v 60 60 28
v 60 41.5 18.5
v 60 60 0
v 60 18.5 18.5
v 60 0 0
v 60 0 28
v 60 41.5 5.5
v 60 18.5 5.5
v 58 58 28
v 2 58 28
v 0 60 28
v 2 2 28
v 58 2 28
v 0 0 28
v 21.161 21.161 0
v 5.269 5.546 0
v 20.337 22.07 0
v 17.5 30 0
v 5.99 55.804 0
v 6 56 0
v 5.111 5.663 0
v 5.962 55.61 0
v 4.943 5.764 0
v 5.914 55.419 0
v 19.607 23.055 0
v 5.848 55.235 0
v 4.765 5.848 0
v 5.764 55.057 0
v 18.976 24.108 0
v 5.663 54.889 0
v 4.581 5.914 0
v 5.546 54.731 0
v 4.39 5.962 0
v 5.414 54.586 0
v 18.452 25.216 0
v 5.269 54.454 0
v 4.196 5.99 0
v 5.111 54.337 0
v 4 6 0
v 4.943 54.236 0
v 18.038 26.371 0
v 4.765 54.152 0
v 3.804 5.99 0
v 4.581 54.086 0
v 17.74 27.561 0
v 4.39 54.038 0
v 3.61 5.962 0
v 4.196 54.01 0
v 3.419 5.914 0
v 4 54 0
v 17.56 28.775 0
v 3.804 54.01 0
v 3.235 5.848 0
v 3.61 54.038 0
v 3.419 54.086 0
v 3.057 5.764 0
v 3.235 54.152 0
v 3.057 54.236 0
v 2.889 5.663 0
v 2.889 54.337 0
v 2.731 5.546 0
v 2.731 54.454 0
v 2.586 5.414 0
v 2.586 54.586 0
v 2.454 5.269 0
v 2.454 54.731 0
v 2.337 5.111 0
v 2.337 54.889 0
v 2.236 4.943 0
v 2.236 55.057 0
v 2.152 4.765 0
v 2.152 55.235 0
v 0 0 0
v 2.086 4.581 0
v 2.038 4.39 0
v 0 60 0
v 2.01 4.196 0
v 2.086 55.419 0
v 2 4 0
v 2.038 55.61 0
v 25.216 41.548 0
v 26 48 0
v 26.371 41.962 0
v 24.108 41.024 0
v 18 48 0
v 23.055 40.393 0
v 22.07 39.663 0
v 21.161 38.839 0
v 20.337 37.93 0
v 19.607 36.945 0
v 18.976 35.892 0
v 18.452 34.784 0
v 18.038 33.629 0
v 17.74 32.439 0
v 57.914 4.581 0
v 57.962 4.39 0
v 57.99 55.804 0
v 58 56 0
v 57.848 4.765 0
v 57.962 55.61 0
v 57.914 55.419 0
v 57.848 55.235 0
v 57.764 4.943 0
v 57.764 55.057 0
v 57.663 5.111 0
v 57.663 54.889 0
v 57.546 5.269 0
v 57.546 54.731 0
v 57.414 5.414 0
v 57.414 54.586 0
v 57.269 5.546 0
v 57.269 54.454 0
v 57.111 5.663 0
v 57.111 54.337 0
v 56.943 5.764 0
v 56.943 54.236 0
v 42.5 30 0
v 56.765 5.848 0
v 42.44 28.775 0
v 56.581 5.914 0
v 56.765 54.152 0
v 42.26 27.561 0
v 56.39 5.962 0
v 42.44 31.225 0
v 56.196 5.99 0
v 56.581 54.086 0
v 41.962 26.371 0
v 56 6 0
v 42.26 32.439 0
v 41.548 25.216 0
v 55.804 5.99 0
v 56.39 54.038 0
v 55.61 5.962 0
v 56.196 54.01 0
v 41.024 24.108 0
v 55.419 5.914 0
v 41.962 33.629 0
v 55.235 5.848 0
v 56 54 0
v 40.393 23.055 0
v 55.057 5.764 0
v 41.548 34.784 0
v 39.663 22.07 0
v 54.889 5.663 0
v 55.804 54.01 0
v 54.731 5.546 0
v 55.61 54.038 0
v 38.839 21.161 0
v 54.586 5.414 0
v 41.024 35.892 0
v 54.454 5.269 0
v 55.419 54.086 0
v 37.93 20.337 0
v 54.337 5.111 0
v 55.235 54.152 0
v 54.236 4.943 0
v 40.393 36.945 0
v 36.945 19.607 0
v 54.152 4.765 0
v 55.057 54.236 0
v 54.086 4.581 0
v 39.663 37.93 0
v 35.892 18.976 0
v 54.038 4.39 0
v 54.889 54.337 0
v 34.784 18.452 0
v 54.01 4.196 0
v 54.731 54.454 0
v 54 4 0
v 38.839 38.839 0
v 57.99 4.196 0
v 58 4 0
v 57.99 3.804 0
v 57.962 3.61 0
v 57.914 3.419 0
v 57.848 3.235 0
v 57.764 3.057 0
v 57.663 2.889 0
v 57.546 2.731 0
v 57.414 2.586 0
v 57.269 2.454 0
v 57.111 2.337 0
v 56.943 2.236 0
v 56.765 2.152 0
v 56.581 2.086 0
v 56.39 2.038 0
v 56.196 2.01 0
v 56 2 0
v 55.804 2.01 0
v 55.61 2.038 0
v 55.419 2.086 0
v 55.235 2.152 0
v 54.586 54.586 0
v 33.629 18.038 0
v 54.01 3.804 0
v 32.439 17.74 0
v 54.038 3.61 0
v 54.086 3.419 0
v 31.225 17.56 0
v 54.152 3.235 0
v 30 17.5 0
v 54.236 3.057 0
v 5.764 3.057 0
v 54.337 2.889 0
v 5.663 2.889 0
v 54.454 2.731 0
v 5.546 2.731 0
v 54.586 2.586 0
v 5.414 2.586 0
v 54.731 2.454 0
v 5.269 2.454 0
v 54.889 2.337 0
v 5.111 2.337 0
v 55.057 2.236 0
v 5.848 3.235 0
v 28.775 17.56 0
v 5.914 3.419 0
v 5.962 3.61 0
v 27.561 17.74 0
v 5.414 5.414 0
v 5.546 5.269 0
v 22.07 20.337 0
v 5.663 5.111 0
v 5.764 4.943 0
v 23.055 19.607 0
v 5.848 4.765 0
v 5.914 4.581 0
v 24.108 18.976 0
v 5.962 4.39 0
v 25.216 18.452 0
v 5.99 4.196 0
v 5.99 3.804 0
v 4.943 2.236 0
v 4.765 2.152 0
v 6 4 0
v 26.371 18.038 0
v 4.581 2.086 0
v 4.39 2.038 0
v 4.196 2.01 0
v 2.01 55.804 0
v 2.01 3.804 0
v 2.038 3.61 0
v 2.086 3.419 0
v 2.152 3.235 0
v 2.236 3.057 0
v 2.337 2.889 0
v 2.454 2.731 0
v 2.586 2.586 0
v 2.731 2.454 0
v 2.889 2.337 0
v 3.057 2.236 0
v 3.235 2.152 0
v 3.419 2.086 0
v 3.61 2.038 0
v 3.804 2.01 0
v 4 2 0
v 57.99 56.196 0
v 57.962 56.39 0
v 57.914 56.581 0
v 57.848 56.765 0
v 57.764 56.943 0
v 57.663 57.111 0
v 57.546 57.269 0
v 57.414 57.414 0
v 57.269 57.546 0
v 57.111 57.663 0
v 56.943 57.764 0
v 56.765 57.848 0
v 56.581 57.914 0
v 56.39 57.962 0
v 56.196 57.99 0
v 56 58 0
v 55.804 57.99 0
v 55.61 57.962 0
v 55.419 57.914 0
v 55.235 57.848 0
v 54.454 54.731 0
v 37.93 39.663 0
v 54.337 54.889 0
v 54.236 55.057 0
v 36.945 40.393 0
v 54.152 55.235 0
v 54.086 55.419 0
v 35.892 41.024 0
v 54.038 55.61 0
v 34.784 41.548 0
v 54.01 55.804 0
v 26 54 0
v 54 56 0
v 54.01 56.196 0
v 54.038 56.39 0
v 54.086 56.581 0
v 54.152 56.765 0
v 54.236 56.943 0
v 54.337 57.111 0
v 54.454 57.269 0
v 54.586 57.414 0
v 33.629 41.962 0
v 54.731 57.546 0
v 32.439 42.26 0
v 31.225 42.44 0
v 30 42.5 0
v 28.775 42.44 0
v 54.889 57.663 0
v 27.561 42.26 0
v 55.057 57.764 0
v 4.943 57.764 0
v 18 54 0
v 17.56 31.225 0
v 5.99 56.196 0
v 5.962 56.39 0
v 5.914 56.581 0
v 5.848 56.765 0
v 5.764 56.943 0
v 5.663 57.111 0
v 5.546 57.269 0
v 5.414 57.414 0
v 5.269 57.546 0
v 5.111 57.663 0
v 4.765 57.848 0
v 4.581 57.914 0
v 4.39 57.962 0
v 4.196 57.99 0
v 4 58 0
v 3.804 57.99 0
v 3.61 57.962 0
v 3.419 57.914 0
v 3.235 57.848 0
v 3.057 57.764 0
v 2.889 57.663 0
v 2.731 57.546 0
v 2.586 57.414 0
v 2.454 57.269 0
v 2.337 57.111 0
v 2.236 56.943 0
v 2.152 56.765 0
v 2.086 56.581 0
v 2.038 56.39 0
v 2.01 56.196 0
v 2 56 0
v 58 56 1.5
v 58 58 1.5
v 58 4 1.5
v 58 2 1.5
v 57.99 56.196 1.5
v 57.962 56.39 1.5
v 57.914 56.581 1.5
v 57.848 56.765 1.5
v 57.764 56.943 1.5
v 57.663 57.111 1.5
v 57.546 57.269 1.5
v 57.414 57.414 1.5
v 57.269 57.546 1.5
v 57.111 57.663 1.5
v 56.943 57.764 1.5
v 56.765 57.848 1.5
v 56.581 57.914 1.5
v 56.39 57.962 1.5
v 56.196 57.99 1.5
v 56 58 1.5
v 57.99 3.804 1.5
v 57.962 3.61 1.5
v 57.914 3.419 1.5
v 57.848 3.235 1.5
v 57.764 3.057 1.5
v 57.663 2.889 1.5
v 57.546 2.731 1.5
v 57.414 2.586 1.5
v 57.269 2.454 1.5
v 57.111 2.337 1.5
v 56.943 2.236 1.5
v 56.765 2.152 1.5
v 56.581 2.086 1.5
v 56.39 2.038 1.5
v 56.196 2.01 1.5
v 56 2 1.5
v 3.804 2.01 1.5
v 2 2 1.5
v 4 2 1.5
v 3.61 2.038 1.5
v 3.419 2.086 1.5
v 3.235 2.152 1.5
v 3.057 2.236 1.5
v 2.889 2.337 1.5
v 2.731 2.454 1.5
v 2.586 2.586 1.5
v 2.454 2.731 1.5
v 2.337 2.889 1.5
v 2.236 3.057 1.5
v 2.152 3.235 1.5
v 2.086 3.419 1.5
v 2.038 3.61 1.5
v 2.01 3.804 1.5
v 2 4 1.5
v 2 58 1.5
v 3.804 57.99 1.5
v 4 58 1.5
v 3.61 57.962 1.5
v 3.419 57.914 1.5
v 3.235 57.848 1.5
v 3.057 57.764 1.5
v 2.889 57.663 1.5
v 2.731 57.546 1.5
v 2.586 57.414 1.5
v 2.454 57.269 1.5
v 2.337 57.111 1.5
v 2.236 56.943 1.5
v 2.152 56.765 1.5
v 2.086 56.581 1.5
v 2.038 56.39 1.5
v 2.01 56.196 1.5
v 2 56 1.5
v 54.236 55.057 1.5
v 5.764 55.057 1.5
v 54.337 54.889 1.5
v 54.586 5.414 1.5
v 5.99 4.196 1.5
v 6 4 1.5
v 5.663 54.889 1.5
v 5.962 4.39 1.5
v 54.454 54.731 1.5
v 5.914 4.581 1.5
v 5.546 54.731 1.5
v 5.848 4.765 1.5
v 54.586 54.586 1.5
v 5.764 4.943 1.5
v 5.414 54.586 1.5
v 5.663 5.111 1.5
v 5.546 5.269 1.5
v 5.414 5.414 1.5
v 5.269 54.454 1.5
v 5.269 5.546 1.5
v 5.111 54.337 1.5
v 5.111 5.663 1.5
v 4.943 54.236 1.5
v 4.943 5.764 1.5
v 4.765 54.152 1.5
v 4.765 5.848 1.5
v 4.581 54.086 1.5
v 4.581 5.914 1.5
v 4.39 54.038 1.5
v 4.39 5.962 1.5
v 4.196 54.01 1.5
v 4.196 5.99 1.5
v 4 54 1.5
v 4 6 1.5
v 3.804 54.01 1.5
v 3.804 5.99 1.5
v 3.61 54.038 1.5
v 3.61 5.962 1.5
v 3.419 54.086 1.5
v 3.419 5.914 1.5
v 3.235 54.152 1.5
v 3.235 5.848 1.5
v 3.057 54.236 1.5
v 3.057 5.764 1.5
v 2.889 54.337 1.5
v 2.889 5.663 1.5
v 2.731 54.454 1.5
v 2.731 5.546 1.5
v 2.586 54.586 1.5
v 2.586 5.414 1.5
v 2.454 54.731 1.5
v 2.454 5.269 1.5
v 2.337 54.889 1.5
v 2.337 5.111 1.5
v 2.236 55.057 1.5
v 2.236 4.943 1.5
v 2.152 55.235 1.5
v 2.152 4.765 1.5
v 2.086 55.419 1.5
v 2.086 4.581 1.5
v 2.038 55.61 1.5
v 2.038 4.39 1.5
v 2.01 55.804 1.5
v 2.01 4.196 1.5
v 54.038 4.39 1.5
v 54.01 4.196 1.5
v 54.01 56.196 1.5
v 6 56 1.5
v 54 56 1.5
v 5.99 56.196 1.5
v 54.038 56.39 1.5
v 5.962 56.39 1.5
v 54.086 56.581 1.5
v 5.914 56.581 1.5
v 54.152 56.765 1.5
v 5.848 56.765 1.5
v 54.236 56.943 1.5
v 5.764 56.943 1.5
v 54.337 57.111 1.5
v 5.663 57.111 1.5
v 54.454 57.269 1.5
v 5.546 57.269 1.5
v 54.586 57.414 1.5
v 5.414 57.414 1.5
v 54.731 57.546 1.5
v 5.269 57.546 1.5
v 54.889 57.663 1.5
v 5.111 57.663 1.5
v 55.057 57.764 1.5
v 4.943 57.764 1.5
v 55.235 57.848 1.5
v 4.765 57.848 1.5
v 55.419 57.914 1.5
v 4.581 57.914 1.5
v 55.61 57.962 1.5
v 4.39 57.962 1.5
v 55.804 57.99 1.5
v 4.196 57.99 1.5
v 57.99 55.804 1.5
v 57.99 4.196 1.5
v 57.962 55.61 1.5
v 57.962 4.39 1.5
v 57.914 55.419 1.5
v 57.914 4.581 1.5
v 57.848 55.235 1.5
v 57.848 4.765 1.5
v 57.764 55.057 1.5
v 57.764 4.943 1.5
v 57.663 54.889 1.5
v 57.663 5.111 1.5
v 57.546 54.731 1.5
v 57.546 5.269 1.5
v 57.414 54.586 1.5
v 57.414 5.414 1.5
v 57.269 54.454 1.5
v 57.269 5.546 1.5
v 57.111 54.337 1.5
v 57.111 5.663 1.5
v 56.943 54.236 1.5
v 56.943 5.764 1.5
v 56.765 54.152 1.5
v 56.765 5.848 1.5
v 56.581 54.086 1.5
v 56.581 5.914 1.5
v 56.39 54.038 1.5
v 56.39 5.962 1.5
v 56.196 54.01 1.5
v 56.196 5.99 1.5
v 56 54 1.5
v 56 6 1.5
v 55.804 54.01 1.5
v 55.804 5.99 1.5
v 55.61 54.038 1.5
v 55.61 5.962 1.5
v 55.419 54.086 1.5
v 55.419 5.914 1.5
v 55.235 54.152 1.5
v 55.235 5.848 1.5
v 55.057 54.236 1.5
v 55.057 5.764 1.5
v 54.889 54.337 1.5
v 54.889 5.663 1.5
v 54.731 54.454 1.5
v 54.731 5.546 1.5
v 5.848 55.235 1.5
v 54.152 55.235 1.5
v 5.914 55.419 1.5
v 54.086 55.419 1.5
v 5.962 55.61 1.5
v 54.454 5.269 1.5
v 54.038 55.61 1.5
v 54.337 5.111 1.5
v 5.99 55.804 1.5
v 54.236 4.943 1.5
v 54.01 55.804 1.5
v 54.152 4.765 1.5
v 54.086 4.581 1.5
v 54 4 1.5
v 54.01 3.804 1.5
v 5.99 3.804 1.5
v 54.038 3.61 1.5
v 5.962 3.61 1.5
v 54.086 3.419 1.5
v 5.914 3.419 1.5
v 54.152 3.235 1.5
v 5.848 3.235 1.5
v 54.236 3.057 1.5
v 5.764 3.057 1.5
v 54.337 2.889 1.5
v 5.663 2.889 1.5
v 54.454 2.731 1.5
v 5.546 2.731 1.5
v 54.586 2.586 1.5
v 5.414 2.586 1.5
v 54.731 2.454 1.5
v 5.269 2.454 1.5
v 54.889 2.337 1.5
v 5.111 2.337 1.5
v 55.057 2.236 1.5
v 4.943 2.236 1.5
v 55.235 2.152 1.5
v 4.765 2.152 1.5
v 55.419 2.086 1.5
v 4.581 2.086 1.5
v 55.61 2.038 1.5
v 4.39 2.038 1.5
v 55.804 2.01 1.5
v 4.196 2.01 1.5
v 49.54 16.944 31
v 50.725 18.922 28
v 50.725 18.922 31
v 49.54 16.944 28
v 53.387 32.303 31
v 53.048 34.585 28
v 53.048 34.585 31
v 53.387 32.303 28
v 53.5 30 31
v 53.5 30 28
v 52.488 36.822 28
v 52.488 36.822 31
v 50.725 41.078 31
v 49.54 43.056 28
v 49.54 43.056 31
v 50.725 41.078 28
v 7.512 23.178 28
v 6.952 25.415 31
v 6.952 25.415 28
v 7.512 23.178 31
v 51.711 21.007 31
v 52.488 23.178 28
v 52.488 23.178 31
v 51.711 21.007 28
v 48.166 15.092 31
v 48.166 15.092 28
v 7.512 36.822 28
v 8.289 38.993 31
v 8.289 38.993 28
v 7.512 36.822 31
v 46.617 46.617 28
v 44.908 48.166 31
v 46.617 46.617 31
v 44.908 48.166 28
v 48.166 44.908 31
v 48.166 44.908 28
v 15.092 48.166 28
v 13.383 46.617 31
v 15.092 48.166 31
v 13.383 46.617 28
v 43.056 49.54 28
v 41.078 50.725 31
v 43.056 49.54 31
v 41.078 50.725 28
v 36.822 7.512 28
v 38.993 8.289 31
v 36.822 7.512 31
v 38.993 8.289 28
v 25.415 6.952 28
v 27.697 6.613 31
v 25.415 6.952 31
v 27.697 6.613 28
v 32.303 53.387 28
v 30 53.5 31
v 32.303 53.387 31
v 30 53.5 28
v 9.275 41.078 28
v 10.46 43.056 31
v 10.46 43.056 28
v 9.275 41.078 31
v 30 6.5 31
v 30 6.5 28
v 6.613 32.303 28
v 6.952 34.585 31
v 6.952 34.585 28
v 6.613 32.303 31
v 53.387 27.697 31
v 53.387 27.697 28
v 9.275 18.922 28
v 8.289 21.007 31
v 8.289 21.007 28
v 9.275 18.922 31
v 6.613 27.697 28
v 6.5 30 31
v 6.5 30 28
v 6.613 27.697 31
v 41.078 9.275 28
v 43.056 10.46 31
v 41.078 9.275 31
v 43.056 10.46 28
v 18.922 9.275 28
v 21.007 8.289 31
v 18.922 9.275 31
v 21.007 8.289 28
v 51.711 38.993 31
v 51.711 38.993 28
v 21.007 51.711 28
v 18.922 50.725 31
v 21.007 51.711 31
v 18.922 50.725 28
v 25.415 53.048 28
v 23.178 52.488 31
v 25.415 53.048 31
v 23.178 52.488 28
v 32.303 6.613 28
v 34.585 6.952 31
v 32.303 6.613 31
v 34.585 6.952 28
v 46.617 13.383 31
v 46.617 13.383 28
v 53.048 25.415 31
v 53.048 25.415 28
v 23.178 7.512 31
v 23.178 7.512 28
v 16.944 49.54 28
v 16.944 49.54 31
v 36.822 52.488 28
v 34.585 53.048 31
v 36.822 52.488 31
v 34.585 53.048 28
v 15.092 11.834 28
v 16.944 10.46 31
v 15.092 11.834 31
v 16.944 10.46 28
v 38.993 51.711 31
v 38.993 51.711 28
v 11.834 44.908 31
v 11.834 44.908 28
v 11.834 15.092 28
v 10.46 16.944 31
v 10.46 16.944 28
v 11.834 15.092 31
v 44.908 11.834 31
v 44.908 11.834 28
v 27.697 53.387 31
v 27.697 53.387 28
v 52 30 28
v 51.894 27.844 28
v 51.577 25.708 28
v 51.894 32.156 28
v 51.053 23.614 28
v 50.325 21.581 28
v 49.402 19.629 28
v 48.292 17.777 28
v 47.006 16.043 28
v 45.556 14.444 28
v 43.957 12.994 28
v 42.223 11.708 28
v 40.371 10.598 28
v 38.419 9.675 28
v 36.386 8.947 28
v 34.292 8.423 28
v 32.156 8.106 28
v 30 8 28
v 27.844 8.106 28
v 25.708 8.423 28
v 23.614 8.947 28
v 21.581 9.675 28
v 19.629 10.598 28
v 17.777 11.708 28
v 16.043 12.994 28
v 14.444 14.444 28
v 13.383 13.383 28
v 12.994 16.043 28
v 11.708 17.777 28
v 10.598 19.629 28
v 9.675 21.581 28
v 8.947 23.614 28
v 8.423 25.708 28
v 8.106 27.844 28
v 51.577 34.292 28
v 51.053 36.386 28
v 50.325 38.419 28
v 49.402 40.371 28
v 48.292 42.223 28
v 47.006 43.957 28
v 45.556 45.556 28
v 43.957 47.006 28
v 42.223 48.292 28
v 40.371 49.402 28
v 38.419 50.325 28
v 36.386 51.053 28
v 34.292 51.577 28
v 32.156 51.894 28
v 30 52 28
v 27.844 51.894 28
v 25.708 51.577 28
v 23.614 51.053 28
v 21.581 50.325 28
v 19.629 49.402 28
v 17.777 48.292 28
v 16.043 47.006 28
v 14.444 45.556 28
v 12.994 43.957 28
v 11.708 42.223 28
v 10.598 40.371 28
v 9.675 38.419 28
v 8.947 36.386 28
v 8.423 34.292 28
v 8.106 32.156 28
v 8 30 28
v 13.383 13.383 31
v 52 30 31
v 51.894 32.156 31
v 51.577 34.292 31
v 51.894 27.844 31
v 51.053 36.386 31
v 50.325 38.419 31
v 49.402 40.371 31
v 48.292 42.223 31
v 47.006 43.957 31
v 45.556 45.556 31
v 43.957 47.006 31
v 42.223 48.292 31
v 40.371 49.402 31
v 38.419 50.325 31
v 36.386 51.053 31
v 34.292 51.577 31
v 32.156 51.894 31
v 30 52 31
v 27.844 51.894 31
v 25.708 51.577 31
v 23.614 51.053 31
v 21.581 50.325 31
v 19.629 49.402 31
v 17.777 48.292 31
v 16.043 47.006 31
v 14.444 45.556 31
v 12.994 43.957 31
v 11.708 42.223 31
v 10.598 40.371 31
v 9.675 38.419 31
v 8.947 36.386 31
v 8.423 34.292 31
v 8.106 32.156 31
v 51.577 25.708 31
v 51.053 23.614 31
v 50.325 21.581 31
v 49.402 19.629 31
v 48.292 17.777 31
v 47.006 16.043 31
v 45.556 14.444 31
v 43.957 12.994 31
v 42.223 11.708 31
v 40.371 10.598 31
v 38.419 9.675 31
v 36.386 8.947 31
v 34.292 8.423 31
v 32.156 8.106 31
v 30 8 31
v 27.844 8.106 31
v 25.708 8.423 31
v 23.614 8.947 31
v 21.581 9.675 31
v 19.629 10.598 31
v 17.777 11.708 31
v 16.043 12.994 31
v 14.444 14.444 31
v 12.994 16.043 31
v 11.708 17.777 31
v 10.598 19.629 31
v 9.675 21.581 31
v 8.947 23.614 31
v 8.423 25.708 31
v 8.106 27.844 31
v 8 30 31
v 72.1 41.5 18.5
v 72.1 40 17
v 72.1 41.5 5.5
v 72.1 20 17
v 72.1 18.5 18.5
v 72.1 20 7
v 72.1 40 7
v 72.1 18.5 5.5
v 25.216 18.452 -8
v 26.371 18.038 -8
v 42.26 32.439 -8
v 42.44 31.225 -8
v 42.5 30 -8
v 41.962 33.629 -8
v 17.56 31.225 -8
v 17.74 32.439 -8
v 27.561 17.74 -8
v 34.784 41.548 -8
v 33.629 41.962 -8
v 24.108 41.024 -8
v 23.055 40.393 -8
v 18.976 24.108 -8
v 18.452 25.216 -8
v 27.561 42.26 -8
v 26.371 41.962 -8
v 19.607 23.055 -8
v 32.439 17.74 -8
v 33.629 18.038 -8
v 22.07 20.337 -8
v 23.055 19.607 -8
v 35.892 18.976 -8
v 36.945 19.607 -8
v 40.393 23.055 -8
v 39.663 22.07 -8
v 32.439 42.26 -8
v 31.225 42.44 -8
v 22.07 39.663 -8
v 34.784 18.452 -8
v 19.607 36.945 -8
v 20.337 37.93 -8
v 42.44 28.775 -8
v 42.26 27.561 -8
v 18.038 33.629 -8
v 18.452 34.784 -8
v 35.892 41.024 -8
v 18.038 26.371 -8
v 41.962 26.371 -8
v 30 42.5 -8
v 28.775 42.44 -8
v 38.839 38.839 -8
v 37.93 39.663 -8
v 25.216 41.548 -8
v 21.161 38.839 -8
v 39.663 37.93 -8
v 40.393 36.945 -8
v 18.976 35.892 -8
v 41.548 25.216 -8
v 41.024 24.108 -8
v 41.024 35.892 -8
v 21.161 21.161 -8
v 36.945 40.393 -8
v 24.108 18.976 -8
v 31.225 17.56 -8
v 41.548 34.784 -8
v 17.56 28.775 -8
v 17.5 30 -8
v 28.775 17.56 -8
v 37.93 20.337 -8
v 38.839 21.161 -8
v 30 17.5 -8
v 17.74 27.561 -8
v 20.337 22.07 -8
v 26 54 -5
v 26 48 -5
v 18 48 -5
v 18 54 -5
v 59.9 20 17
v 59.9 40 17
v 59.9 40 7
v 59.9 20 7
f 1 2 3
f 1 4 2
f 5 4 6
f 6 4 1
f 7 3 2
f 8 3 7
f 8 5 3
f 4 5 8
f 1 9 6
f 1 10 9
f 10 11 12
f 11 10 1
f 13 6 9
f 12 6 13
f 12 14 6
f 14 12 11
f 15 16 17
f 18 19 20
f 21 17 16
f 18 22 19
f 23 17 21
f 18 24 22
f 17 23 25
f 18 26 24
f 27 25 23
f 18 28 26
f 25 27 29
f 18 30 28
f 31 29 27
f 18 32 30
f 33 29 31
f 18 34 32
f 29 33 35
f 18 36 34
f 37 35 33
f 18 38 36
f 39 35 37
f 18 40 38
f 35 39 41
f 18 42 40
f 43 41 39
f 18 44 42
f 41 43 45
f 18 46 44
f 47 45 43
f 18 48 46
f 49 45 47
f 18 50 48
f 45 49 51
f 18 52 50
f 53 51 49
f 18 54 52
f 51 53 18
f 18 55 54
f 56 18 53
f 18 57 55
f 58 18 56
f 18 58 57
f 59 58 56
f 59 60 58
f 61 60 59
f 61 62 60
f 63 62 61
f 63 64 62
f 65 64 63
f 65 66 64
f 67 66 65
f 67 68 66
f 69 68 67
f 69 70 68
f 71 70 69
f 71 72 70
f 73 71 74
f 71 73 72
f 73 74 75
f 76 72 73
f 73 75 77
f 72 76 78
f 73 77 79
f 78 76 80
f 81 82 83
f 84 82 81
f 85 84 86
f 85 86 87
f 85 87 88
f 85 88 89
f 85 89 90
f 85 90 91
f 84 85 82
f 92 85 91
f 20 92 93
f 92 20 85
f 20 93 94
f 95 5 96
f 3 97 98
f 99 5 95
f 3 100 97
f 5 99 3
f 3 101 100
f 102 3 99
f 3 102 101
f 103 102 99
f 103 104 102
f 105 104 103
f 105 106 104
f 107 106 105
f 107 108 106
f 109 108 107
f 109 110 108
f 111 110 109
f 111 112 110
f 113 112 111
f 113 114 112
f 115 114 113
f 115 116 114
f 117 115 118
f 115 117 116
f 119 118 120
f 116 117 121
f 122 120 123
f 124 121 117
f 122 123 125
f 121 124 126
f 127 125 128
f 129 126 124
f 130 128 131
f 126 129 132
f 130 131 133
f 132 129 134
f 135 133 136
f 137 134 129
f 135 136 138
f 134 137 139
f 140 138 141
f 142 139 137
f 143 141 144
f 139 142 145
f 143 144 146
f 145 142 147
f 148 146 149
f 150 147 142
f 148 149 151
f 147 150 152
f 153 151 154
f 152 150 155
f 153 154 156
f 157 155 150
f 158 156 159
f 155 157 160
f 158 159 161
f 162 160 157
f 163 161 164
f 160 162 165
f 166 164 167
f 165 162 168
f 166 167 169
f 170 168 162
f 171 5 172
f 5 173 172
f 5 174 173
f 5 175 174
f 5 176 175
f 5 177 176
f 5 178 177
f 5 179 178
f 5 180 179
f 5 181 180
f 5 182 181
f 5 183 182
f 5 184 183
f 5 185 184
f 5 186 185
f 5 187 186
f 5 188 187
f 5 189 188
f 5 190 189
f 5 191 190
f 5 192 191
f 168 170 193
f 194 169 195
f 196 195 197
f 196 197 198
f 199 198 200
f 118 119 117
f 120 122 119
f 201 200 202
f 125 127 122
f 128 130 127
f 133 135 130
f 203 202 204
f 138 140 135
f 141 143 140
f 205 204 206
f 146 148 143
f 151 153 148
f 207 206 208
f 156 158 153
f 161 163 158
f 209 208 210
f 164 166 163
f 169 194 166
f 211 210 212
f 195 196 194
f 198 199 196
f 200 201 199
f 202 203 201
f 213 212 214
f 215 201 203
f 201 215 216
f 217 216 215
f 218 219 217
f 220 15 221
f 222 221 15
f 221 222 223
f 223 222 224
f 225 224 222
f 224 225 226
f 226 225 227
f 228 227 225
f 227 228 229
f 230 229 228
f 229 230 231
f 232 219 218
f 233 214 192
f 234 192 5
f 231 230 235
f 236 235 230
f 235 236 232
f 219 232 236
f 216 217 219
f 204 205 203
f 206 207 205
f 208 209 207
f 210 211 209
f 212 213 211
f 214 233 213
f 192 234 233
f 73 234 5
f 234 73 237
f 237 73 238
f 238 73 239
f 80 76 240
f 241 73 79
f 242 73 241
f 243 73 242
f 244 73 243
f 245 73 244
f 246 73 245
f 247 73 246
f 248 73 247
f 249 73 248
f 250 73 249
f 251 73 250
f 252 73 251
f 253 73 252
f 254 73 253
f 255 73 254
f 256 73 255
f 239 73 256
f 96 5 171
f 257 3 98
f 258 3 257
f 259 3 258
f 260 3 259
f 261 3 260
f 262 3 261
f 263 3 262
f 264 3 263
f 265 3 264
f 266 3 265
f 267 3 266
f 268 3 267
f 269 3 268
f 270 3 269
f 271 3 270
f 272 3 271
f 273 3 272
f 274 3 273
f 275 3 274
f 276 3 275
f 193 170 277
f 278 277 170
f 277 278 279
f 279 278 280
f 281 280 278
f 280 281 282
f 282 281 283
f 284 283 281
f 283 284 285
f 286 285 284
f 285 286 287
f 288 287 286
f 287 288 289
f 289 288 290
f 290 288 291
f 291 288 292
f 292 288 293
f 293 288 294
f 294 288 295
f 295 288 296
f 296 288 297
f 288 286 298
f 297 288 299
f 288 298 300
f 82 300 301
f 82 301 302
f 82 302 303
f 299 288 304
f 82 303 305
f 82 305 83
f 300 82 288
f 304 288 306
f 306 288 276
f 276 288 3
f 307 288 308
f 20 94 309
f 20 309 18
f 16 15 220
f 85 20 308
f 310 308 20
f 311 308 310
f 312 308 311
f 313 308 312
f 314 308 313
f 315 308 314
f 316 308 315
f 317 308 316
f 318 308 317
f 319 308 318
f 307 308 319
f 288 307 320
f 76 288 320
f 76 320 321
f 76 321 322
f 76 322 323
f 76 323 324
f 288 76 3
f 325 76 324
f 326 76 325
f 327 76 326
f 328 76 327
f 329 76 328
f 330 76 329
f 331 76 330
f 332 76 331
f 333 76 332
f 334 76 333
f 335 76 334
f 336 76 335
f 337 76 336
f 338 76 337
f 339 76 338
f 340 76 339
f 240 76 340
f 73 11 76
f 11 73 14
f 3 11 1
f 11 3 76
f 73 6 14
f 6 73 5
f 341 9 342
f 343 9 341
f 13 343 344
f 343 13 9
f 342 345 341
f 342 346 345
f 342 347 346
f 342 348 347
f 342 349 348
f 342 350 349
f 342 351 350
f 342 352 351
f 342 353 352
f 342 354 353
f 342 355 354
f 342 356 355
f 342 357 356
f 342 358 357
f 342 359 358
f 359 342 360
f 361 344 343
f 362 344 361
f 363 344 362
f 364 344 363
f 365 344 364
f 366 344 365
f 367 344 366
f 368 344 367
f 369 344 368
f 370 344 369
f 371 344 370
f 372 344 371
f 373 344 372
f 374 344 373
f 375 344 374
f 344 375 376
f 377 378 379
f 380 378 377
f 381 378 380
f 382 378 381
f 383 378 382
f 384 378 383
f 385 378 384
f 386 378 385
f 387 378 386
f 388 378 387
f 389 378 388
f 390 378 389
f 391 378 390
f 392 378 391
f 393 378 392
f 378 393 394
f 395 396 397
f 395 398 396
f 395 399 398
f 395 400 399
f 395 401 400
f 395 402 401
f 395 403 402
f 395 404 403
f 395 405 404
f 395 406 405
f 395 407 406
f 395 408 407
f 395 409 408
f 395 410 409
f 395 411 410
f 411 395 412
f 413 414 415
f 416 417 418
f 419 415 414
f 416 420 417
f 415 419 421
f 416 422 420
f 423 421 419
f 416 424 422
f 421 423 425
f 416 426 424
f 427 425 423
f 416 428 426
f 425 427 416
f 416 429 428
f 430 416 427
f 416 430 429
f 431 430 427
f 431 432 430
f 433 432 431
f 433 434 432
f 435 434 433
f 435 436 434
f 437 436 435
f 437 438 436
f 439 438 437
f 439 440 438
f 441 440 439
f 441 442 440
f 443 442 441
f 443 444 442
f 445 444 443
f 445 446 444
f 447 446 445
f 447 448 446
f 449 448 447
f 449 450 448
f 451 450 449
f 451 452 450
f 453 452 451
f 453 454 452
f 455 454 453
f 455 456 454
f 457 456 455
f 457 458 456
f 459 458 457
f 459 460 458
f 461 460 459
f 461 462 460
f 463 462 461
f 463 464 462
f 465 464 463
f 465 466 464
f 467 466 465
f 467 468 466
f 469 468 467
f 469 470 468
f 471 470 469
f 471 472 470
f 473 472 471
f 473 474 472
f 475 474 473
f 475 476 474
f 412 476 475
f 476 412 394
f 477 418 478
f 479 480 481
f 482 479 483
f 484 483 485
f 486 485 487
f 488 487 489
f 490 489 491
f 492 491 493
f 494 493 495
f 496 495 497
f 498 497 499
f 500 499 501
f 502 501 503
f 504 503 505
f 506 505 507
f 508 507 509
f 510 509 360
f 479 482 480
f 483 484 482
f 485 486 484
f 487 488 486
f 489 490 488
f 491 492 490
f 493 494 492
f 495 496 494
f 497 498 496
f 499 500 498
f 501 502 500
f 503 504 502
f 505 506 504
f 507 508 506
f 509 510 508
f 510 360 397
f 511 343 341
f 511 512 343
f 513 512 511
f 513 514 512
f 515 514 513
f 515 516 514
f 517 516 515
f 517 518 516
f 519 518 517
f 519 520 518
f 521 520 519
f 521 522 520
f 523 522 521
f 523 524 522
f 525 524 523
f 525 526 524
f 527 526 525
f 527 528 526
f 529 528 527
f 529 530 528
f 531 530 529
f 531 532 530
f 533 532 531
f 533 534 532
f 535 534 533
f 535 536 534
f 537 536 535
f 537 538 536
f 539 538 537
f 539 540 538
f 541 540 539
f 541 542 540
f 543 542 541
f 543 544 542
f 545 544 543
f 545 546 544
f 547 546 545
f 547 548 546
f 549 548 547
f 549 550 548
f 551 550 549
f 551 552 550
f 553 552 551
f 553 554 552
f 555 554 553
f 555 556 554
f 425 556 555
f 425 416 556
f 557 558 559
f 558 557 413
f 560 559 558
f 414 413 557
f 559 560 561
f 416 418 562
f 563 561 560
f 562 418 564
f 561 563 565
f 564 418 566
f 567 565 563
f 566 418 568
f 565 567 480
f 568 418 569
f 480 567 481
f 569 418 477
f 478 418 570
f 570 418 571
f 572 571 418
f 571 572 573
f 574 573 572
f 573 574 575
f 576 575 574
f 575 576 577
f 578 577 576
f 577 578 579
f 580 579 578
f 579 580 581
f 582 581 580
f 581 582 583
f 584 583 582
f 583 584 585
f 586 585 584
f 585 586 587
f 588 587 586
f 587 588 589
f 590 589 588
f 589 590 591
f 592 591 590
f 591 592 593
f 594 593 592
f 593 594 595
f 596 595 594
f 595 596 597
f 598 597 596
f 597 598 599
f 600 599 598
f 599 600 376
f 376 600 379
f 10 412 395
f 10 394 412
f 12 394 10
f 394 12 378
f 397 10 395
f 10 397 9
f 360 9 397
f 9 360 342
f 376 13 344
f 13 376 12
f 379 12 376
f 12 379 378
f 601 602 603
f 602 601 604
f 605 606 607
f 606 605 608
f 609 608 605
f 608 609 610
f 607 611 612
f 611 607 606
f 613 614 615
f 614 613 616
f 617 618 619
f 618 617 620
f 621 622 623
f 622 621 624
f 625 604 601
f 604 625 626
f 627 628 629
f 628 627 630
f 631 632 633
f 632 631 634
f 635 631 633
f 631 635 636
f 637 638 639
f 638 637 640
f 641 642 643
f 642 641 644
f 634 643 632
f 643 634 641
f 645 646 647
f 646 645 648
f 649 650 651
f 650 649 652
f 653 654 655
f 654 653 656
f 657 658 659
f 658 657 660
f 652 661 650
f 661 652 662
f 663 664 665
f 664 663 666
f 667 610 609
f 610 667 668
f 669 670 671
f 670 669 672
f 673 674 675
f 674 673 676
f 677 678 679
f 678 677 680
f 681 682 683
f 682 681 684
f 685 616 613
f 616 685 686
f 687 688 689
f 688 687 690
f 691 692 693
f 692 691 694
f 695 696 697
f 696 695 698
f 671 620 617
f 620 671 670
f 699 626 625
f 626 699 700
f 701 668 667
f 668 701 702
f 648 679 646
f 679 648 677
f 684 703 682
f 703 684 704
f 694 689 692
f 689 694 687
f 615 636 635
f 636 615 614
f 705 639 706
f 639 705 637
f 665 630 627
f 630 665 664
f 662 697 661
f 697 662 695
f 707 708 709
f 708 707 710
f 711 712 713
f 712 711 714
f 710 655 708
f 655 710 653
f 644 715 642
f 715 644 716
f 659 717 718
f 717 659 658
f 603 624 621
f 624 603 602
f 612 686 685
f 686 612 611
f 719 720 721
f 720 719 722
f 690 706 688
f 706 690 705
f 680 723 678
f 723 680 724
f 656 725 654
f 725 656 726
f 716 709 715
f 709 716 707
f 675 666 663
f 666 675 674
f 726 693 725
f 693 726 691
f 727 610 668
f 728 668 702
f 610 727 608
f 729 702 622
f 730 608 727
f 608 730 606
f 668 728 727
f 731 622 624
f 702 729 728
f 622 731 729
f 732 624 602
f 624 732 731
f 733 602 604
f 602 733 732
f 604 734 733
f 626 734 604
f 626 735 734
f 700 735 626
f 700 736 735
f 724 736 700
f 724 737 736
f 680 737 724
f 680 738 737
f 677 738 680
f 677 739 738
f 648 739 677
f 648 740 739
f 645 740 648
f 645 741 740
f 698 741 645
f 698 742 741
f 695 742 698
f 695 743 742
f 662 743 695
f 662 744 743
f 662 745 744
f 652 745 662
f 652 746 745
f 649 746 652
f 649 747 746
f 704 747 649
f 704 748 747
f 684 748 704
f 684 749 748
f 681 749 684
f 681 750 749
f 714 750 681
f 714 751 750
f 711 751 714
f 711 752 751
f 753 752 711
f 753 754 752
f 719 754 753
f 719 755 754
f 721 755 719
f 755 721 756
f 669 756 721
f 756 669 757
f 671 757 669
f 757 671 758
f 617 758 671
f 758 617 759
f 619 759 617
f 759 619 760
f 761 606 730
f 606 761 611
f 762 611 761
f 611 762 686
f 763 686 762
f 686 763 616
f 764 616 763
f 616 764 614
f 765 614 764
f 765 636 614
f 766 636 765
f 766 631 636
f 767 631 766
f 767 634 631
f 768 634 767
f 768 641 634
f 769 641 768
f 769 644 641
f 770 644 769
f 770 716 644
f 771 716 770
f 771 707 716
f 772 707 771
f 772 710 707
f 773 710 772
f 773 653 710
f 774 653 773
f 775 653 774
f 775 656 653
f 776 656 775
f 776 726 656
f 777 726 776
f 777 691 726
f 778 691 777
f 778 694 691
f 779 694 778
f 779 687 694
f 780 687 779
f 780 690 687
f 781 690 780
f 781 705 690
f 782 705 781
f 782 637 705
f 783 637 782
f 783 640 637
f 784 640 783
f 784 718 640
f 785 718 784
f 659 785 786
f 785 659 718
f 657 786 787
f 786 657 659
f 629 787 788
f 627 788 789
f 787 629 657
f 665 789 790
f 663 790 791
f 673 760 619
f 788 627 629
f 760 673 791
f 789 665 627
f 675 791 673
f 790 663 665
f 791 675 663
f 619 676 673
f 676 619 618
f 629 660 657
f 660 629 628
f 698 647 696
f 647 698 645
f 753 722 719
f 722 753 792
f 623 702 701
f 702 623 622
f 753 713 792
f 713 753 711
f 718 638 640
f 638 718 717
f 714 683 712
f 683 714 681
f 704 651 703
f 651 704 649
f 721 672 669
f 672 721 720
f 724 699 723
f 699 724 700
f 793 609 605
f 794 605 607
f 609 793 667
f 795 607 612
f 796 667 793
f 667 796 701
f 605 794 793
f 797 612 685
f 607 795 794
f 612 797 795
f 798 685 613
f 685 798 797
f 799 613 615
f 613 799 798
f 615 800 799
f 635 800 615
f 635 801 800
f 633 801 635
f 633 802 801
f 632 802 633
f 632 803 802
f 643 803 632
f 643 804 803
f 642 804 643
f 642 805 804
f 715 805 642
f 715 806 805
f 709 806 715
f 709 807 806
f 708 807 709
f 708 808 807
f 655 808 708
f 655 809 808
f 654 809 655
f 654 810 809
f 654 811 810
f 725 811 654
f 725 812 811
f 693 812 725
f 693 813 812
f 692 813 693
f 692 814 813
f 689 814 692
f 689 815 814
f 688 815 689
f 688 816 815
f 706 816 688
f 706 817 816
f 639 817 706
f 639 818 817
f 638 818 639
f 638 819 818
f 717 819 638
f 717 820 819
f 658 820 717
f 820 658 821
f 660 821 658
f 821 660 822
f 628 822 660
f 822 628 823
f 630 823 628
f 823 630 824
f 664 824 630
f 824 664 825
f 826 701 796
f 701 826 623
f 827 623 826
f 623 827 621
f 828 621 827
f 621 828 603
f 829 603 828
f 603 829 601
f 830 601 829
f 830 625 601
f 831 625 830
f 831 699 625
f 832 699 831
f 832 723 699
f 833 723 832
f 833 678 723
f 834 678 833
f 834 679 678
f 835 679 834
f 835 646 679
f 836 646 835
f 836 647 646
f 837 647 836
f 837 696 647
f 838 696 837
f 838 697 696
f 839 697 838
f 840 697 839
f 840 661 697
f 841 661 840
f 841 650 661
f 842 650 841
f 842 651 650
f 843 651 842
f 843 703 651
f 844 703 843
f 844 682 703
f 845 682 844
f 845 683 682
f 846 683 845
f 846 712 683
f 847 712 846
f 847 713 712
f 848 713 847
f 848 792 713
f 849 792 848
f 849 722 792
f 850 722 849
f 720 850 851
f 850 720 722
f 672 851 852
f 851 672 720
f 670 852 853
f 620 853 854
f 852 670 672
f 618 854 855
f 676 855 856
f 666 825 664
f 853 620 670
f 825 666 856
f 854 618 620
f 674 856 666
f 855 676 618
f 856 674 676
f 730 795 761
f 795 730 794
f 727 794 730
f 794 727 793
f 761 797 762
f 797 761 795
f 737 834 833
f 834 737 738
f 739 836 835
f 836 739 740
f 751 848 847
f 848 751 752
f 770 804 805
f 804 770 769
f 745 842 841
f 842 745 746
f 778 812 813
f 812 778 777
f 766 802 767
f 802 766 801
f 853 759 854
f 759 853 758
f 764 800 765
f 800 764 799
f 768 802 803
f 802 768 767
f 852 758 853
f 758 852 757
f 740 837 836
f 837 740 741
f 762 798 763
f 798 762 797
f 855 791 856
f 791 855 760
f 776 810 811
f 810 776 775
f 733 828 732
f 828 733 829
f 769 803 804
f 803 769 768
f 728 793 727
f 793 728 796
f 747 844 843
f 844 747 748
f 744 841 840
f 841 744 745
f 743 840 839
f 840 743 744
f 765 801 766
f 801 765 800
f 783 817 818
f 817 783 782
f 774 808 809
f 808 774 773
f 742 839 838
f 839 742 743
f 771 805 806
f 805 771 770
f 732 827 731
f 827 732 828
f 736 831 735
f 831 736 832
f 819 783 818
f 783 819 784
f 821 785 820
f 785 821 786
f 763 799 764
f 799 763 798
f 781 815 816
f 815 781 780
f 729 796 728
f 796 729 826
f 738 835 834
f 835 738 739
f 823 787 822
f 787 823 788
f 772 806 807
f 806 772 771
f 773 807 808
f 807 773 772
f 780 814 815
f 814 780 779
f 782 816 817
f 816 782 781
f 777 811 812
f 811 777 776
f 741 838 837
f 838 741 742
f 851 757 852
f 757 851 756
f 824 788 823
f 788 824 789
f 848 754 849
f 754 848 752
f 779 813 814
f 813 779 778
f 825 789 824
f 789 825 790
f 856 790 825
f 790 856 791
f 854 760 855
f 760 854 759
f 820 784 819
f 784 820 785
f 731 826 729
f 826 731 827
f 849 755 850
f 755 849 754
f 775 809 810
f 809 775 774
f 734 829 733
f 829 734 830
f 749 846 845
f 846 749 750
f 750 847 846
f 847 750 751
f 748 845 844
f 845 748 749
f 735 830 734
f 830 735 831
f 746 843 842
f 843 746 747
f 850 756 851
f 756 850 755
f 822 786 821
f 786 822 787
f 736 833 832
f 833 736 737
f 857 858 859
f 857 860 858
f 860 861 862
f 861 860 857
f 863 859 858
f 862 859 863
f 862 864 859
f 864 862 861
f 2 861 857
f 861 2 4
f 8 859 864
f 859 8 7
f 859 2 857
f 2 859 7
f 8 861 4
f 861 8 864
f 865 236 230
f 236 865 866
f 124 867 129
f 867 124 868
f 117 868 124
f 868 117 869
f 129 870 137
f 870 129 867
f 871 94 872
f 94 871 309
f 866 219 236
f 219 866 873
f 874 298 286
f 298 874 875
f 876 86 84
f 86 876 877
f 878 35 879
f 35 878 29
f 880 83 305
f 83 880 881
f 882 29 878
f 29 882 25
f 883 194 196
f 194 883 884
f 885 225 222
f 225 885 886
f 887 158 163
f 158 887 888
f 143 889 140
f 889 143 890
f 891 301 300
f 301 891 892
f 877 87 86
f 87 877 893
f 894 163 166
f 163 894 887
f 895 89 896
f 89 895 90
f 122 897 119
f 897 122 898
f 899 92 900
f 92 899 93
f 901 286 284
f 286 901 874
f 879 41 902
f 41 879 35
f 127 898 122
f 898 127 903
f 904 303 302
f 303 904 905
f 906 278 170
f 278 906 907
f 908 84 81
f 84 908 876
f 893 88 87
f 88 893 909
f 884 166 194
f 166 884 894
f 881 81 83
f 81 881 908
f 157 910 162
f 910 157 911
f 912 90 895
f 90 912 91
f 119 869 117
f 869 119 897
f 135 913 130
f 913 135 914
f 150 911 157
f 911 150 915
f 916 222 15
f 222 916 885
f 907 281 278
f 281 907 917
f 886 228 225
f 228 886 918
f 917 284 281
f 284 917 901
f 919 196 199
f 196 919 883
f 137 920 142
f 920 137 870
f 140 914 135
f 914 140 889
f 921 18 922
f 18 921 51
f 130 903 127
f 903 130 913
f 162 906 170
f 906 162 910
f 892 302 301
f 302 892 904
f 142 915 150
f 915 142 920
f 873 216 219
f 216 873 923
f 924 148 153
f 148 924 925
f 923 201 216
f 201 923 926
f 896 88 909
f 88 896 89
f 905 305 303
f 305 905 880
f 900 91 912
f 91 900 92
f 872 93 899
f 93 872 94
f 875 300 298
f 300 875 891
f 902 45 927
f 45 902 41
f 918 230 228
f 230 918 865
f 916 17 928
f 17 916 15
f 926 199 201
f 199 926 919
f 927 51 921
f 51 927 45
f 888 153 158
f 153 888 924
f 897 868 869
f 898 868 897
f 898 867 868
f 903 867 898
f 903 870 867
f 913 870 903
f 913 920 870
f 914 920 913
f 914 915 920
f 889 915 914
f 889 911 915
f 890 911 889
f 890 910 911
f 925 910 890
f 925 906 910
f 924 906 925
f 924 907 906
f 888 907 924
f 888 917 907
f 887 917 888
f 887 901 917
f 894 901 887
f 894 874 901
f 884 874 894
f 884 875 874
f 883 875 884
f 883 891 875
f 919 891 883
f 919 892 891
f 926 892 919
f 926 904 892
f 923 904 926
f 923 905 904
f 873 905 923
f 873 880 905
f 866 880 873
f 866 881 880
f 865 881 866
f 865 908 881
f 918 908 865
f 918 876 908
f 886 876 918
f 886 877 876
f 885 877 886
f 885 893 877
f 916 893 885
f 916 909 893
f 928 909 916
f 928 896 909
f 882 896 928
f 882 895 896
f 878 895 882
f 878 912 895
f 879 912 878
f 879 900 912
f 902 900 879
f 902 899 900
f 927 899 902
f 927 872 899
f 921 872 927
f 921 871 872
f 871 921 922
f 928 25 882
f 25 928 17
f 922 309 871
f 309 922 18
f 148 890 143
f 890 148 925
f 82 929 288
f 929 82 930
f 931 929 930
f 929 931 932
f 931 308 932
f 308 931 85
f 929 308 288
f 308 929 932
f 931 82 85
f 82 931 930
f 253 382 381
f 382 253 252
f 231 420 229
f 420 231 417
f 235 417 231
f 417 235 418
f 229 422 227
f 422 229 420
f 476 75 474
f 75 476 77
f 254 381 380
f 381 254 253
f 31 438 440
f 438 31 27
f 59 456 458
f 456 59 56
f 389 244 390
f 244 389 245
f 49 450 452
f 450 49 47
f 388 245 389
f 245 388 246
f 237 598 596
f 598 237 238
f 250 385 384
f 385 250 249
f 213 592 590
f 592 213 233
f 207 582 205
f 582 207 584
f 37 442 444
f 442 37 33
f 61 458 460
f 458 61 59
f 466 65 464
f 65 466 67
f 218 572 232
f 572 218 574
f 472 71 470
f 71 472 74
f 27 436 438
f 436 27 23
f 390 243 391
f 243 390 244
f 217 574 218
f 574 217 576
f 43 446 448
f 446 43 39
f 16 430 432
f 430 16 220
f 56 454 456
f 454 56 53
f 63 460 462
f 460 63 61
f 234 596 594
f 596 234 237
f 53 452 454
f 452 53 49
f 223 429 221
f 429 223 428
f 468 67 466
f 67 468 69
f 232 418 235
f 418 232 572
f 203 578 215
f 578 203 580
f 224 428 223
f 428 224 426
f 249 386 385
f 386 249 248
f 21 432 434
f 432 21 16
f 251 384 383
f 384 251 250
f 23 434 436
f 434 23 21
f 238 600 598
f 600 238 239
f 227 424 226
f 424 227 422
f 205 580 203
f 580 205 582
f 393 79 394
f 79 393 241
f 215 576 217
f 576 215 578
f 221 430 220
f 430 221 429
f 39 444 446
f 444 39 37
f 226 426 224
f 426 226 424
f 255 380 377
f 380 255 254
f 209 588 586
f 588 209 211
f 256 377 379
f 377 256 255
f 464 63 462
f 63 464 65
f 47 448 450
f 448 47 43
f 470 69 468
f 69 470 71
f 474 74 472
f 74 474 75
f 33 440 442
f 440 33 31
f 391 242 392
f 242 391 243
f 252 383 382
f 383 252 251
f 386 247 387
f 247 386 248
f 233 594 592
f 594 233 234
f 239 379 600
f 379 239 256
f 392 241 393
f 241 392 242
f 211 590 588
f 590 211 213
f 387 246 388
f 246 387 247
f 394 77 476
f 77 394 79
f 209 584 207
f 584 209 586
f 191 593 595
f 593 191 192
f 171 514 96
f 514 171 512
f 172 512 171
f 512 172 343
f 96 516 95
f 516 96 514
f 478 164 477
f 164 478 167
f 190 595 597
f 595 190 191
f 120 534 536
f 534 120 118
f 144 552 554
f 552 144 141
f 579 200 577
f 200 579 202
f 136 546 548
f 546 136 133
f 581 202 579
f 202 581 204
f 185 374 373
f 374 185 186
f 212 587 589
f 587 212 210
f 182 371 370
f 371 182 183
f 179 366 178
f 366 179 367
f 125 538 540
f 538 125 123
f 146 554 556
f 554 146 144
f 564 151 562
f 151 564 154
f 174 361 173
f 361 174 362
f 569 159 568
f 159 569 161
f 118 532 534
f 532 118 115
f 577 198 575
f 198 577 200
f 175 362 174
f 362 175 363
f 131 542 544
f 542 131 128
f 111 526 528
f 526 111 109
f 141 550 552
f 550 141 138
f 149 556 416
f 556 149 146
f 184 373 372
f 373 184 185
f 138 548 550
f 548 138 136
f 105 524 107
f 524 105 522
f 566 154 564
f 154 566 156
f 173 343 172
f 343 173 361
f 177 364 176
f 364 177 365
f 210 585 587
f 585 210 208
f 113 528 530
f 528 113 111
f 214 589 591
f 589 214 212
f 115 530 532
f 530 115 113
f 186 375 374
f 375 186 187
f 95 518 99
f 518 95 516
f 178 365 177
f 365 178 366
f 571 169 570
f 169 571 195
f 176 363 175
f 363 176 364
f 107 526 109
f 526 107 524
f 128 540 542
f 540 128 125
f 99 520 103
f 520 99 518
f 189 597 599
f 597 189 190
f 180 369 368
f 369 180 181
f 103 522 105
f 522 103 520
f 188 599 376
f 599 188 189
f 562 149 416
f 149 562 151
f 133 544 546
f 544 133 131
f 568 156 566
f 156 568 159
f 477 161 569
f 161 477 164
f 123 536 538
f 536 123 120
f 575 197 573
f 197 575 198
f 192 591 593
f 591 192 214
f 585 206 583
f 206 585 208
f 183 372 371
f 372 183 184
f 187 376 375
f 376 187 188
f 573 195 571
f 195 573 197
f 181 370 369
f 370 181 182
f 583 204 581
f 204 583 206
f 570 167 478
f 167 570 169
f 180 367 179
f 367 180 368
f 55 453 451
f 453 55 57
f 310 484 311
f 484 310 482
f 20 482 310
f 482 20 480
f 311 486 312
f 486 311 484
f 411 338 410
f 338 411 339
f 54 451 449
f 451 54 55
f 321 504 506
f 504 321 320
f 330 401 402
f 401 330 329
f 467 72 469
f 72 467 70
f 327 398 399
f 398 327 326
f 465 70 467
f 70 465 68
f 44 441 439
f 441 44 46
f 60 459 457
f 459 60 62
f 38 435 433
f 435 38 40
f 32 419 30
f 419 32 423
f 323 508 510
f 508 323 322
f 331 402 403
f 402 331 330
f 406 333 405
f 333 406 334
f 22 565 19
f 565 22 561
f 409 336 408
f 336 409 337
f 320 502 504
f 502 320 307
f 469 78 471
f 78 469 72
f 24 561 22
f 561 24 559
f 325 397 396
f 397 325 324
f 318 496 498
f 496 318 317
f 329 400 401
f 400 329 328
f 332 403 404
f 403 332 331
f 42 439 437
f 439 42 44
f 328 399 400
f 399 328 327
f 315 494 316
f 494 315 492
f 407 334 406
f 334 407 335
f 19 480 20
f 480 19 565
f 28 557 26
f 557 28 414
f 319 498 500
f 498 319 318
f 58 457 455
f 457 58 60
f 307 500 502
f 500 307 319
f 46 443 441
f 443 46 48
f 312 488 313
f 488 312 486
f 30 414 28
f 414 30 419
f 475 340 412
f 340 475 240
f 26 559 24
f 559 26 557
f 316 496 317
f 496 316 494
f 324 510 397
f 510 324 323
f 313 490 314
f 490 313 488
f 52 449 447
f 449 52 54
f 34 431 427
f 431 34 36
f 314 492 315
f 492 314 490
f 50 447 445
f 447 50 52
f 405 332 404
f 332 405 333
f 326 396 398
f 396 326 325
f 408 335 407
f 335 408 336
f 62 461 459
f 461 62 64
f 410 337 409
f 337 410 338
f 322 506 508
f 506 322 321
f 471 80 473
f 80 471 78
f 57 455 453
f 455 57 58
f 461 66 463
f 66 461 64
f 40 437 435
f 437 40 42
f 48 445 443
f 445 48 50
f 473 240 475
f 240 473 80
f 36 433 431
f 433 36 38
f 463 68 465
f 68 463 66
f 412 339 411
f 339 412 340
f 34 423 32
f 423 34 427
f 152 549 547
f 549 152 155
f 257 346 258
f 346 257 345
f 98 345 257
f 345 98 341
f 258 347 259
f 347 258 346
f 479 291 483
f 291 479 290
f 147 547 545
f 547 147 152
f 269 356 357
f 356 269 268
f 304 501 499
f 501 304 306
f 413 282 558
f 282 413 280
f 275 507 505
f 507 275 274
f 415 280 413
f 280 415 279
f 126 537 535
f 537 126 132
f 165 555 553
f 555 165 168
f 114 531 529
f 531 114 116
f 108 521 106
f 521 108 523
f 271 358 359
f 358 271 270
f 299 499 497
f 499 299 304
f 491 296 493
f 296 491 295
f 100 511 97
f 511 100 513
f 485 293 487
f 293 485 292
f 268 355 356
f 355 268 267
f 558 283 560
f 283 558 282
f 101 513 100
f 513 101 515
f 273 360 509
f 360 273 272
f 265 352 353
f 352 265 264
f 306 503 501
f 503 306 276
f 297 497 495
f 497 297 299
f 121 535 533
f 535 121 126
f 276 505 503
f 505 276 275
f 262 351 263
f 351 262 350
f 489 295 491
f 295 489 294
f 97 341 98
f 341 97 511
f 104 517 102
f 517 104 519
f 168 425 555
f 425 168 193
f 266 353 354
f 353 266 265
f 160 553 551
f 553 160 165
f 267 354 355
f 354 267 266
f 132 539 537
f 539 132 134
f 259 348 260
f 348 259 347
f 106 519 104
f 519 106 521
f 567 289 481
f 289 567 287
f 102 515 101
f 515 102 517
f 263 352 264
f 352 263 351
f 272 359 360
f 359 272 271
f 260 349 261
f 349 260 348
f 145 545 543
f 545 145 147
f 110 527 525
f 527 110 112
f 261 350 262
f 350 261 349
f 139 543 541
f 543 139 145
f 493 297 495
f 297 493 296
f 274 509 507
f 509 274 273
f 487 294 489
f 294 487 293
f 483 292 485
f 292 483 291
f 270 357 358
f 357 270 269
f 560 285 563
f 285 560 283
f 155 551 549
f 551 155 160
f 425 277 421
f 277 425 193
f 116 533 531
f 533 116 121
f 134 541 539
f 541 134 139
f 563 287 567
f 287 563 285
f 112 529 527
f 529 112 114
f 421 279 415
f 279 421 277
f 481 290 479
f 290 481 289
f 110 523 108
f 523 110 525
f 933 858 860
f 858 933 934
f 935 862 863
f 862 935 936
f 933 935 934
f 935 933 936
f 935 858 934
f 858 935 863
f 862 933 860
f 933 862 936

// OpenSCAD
// Parametric 3D model: Suction Fan Module (Dreame MSD-C-3 / Nidec 20N709U020 class)
// =============================================================================
// This models the centrifugal blower module used in Dreame L10s-series and
// compatible robot vacuums. Dimensions are PRELIMINARY — see MEASURE-ME.md
// for the exact caliper measurements needed.
//
// Units: mm
//
// Author: OsakaTX
// Source: BOM 6 kPa option row; AliExpress listing 1005009973617086
//
// License: CC BY-SA 4.0

/* [Hidden] */
$fn = 64;

/* [Dimensions — EDIT TO MATCH YOUR MEASURED PART] */

// Overall housing width (square profile)
housing_w = 60;   // (unverified, estimate) — seller listing says 60 mm

// Overall housing depth (same as width for square modules)
housing_d = 60;   // (unverified, estimate) — seller listing says 60 mm

// Overall housing height (excluding inlet trumpet)
housing_h = 28;   // (unverified, estimate) — seller listing pkg size 30 mm; subtract ~2 mm lid protrusion

// Wall thickness of plastic housing
wall_t = 2.0;     // (unverified, estimate) — typical injection-molded housing

// Top-plate / lid thickness
lid_t = 1.5;      // (unverified, estimate)

// Inlet hole diameter (circular intake on top face)
inlet_diam = 44;  // (unverified, estimate) — typical for 20N-class blower

// Inlet trumpet lip height above housing
inlet_rim_h = 3;  // (unverified, estimate)

// Inlet trumpet lip wall thickness
inlet_rim_t = 1.5; // (unverified, estimate)

// Outlet duct width (rectangular exhaust port)
outlet_w = 20;    // (unverified, estimate)

// Outlet duct height
outlet_h = 10;    // (unverified, estimate)

// Outlet duct length (protrusion from housing)
outlet_len = 12;  // (unverified, estimate)

// Outlet duct wall thickness
outlet_wall = 1.5; // (unverified, estimate)

// Screw hole diameter (mounting)
screw_d = 4.0;    // (unverified, estimate) — typical M3 clearance

// Screw hole inset from edge
screw_inset = 4;  // (unverified, estimate)

// Motor core diameter (visible below housing)
motor_core_diam = 25; // Nidec 20N series datasheet: φ25 mm

// Motor core height (protruding below housing)
motor_core_h = 8;      // (unverified, estimate) — 13.4 mm total motor length; ~5 mm inside housing

// --- Derived ---
inlet_r = inlet_diam / 2;
screw_r = screw_d / 2;

// ============================================================================
// MODULE: Main housing body
// ============================================================================
module housing_body() {
    difference() {
        // Outer box
        cube([housing_w, housing_d, housing_h]);

        // Inner cavity (hollow)
        translate([wall_t, wall_t, lid_t])
            cube([housing_w - 2*wall_t, housing_d - 2*wall_t, housing_h - lid_t + 0.1]);
    }
}

// ============================================================================
// MODULE: Inlet (circular intake trumpet on top face)
// ============================================================================
module inlet() {
    translate([housing_w/2, housing_d/2, housing_h])
    difference() {
        // Trumpet rim (outer ring)
        cylinder(h = inlet_rim_h, d = inlet_diam + 2*inlet_rim_t);

        // Inner opening
        translate([0, 0, -0.1])
            cylinder(h = inlet_rim_h + 0.2, d = inlet_diam);
    }
}

// ============================================================================
// MODULE: Outlet duct (rectangular exhaust port on one side face)
// ============================================================================
module outlet_duct() {
    // The exhaust port typically exits from the side, near the bottom
    // Centered vertically on the housing bottom half
    outlet_y_offset = housing_d / 2;
    outlet_z_offset = outlet_h / 2 + wall_t;

    translate([housing_w, outlet_y_offset - outlet_w/2, outlet_z_offset])
        cube([outlet_len, outlet_w, outlet_h]);

    // Duct walls (hollow)
    translate([housing_w, outlet_y_offset - outlet_w/2 - outlet_wall, outlet_z_offset - outlet_wall])
        cube([outlet_len + 0.1, outlet_w + 2*outlet_wall, outlet_h + 2*outlet_wall]);
}

// ============================================================================
// MODULE: Mounting ears / screw holes
// ============================================================================
module screw_holes() {
    // Four corner holes
    corners = [
        [screw_inset, screw_inset, 0],
        [housing_w - screw_inset, screw_inset, 0],
        [screw_inset, housing_d - screw_inset, 0],
        [housing_w - screw_inset, housing_d - screw_inset, 0]
    ];

    for (pos = corners) {
        translate([pos[0], pos[1], -0.1])
            cylinder(h = housing_h + 0.2, r = screw_r);
    }
}

// ============================================================================
// MODULE: Motor core (underside protrusion)
// ============================================================================
module motor_core() {
    translate([housing_w/2, housing_d/2, -motor_core_h])
        cylinder(h = motor_core_h, d = motor_core_diam);
}

// ============================================================================
// MODULE: Electrical connector boss (JST-style 2-pin)
// ============================================================================
module connector_boss() {
    // Typical location: near the motor core on the underside, or on the side face
    // (unverified, estimate) — placed at a plausible location
    conn_x = housing_w * 0.3;
    conn_y = housing_d * 0.8;
    conn_z = -5;
    conn_w = 8;
    conn_d = 6;
    conn_h = 6;

    translate([conn_x, conn_y, conn_z])
        cube([conn_w, conn_d, conn_h]);
}

// ============================================================================
// ASSEMBLY
// ============================================================================
module suction_fan_module() {
    // Housing
    housing_body();

    // Inlet trumpet on top
    inlet();

    // Outlet duct on one side
    // The outlet_duct module already includes both inner hollow and outer walls
    // We need a difference approach: add outer walls, subtract inner from housing
    // Actually, let's use a simpler approach:
    // Just add the outlet as a solid block with the housing cut already handled

    // Screw holes (subtractive)
    // We apply these at the assembly level
}

// ============================================================================
// RENDER with proper CSG
// ============================================================================
difference() {
    union() {
        // Main housing
        housing_body();

        // Inlet rim
        inlet();

        // Outlet duct outer shell
        outlet_duct();

        // Motor core protrusion on underside
        motor_core();

        // Connector boss
        connector_boss();
    }

    // Subtract: outlet inner channel
    outlet_y_offset = housing_d / 2;
    outlet_z_offset = outlet_h / 2 + wall_t;
    translate([housing_w - 0.1, outlet_y_offset - outlet_w/2, outlet_z_offset])
        cube([outlet_len + 0.2, outlet_w, outlet_h]);

    // Subtract: screw holes
    screw_holes();
}
